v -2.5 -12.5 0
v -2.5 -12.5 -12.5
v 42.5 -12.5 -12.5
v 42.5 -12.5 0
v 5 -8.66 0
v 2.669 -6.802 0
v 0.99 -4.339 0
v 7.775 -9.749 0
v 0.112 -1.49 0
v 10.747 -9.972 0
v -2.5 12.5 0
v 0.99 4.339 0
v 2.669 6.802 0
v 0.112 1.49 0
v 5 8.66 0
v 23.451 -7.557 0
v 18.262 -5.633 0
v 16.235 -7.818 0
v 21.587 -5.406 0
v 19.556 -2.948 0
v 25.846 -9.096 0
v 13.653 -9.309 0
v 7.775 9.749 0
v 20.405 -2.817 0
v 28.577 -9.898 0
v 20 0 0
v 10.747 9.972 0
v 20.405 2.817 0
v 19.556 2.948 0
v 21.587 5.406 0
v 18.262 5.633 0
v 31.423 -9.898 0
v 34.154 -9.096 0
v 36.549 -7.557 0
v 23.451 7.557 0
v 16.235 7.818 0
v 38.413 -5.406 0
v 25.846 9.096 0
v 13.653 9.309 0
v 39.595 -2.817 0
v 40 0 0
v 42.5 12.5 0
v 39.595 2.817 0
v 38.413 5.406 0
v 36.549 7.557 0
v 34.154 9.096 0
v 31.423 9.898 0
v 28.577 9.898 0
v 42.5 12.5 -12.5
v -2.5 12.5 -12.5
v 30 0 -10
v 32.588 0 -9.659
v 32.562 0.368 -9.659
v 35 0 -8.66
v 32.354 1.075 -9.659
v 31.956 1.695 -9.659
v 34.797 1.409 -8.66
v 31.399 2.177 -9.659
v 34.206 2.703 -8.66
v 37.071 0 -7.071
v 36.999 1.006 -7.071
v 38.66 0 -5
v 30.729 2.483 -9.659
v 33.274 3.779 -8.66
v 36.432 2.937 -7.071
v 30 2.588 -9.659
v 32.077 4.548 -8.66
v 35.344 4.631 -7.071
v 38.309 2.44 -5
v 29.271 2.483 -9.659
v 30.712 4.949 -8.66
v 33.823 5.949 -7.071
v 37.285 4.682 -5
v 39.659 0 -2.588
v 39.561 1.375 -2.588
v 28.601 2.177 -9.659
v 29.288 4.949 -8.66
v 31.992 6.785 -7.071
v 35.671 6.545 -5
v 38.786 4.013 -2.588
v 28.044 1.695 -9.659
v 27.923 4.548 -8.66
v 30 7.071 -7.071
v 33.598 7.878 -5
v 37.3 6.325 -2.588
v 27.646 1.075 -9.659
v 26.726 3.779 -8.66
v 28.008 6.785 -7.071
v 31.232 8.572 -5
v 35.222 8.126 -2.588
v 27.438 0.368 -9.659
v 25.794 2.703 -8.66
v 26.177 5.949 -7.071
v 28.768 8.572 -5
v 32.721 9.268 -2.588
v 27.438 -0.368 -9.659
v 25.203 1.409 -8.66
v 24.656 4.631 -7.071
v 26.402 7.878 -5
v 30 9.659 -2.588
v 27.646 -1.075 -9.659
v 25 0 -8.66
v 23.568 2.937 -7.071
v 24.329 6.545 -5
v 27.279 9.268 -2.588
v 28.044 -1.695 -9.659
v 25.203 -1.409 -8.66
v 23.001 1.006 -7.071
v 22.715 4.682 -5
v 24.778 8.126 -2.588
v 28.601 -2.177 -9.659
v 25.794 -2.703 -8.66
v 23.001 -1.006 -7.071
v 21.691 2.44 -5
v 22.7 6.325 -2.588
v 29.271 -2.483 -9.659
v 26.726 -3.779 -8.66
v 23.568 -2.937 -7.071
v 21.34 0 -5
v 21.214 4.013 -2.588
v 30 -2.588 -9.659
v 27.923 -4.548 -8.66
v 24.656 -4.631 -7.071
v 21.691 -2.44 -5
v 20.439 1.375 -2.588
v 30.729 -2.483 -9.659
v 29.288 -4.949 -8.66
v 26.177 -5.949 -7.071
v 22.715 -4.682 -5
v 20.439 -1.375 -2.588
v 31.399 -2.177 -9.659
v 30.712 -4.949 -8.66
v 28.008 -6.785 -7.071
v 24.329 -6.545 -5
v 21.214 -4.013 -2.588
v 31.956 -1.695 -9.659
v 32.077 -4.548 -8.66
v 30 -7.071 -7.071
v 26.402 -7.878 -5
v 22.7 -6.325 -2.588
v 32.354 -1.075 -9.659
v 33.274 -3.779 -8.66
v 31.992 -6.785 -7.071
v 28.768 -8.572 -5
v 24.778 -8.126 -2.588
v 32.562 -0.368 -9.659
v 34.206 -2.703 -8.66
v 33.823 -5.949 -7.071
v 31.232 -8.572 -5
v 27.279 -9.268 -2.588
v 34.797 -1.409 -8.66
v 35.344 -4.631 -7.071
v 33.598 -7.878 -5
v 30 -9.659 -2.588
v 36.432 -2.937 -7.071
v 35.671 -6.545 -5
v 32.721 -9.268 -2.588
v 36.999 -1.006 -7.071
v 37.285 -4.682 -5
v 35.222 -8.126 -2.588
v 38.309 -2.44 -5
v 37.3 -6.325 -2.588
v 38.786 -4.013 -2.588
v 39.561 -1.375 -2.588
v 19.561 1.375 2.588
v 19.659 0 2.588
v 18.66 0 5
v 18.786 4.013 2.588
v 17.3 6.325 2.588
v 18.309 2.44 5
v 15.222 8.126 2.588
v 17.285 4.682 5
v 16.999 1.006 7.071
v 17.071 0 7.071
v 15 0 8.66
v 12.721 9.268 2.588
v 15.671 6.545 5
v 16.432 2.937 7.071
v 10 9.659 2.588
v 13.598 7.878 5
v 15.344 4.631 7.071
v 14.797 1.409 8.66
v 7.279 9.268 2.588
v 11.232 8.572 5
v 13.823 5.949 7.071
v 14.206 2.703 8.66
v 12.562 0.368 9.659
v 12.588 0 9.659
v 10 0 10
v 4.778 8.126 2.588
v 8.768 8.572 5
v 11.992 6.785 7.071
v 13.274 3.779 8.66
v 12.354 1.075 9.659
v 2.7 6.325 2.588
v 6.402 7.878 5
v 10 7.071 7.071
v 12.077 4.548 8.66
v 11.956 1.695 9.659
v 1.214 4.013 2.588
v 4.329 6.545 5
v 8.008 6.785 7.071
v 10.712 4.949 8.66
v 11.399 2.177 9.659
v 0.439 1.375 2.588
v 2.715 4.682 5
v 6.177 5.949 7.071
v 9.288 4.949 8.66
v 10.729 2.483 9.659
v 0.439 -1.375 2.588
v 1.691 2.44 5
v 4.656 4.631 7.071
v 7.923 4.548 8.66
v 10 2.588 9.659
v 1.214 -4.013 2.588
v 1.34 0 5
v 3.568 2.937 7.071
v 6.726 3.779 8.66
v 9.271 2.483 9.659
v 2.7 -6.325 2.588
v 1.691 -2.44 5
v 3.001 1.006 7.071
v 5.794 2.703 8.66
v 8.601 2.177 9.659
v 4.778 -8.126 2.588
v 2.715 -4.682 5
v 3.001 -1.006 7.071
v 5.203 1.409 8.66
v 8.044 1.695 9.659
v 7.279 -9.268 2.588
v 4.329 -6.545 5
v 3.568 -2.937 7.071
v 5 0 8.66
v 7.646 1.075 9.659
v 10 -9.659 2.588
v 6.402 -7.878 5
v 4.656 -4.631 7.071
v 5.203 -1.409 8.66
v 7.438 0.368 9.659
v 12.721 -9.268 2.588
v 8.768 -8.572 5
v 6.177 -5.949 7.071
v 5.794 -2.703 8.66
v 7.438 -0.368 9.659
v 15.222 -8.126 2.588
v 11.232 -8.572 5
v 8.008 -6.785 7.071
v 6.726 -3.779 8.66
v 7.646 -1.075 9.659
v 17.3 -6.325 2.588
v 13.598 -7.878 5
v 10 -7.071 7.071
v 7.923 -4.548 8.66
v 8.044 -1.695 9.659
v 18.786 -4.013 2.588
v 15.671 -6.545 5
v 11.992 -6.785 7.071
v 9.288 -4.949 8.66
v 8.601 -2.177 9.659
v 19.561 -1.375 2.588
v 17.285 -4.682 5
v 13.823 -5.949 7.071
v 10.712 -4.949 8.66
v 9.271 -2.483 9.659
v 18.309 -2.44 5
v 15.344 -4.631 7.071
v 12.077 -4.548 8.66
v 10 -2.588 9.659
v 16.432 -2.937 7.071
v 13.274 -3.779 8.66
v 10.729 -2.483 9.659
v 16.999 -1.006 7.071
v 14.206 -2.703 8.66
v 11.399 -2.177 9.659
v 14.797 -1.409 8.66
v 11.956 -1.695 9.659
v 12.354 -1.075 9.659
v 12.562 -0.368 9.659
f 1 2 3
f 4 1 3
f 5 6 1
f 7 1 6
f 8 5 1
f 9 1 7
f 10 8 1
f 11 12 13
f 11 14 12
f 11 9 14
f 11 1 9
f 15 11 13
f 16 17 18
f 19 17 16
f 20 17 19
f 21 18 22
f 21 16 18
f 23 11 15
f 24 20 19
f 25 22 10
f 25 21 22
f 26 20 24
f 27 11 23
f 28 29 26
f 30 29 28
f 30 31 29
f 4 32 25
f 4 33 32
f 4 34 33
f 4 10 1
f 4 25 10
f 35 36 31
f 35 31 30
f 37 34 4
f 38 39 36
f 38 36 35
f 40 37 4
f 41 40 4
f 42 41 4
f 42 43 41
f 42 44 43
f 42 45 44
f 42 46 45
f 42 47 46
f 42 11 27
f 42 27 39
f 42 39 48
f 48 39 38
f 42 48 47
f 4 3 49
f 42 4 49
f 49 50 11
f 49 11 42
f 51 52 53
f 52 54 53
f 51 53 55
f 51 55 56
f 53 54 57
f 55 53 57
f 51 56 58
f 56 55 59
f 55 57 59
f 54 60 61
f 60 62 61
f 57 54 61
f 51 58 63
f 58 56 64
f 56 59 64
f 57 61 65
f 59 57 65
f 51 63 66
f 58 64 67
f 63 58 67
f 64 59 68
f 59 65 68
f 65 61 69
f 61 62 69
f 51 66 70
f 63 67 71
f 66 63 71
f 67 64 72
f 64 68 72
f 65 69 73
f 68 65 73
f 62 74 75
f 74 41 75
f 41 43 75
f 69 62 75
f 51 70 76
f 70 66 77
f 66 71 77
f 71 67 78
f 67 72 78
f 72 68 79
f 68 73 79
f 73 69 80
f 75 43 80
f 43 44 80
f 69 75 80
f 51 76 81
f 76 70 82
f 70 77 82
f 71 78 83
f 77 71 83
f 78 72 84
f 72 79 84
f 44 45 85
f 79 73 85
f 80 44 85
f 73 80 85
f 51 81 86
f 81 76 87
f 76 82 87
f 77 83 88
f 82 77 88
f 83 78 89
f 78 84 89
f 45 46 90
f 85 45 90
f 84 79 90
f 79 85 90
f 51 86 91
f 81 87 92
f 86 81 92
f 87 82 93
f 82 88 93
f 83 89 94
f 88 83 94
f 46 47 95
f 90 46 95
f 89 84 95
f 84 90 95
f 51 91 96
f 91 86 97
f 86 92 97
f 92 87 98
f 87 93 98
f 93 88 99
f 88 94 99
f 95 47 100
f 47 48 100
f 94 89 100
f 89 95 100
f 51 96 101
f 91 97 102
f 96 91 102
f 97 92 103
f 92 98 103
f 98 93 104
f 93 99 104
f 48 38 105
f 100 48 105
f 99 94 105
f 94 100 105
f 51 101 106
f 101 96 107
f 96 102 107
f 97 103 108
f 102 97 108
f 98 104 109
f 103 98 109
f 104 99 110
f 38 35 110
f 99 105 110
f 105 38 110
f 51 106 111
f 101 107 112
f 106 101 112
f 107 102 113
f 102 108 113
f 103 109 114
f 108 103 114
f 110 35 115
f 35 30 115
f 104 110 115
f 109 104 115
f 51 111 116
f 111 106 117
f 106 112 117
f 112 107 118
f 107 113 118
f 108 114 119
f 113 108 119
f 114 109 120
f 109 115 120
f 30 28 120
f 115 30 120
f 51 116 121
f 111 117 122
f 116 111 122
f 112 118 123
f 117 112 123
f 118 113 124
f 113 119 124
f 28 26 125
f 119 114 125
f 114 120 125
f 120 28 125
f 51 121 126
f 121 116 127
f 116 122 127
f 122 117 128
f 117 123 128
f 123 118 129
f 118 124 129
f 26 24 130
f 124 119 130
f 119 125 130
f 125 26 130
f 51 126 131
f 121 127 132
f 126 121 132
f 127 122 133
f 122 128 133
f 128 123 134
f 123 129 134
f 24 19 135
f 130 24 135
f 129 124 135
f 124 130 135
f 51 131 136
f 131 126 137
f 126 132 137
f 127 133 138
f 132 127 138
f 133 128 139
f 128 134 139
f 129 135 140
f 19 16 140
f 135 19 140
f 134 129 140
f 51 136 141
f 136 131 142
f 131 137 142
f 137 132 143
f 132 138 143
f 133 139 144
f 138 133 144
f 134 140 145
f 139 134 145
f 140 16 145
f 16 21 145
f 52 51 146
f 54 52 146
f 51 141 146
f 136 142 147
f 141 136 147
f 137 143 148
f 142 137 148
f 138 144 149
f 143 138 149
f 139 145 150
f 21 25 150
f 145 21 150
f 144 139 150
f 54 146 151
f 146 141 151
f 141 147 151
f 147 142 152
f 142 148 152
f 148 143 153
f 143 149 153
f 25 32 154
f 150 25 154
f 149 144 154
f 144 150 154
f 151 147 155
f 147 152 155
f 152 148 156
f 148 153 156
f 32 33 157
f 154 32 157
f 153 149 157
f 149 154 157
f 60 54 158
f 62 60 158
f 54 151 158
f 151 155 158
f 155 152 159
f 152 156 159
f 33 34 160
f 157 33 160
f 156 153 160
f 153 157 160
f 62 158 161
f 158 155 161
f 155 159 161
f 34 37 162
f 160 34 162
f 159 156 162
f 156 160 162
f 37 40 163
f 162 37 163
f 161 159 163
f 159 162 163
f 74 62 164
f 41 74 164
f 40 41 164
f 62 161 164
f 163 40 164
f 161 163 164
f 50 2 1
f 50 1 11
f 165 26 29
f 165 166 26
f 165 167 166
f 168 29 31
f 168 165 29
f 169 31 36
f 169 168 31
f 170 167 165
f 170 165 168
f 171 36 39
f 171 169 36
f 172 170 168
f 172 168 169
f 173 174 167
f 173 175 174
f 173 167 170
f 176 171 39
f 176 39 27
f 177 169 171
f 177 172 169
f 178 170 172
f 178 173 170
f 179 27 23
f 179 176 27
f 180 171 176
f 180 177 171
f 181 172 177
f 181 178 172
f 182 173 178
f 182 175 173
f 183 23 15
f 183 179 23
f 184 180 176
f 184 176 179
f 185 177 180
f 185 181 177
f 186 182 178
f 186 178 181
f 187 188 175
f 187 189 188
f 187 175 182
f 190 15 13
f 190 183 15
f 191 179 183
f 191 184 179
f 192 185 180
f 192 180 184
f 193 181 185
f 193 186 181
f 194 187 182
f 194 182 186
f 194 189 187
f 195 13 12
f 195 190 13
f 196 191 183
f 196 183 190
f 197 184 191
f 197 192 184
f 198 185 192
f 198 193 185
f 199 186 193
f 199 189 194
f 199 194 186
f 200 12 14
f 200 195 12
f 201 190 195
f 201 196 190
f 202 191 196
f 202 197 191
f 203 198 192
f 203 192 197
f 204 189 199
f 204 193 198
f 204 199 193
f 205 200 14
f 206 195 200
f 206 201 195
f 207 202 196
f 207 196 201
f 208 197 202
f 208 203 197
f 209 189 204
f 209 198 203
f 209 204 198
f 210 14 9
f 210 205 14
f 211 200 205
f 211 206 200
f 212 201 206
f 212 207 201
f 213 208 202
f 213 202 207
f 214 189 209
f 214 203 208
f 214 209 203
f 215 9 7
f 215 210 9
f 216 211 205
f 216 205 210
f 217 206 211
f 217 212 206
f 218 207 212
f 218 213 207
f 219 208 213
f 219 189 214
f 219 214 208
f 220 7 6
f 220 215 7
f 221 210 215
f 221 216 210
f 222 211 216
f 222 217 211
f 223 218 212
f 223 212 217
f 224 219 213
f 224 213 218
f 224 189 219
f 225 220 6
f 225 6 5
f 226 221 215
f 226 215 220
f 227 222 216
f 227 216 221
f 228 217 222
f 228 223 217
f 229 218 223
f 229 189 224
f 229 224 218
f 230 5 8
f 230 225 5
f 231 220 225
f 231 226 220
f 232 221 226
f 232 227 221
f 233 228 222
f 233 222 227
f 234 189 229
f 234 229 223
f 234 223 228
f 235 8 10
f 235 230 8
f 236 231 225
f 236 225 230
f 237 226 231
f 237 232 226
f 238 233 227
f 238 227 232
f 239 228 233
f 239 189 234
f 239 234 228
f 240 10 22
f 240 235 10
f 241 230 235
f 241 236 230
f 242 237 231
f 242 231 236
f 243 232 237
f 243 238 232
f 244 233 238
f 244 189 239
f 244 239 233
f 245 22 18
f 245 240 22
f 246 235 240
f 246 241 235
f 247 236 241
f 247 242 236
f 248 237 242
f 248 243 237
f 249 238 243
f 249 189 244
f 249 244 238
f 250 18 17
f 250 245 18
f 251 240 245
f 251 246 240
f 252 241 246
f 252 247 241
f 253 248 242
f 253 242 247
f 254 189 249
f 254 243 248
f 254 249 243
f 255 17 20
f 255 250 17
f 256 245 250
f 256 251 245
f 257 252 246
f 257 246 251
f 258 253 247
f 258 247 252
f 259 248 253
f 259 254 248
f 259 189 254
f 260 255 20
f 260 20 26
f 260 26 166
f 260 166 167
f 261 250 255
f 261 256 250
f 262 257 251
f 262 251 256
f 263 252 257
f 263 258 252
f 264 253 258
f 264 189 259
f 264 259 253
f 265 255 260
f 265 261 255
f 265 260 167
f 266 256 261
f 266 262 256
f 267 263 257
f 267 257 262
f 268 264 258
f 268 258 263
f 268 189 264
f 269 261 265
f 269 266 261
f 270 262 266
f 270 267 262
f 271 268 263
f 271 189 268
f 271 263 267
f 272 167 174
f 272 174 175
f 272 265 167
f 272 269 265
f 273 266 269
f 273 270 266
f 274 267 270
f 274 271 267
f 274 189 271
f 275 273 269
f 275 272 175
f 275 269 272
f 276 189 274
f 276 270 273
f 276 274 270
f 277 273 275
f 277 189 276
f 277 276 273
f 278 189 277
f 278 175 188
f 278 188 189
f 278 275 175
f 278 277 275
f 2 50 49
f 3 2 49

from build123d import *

# Parameters (mm, degrees)
BOX_W     = 45
BOX_H     = 25
BOX_DEPTH = 12.5


with BuildPart() as sphere001:
    # Sphere001 → Sphere001 (revolve)
    with BuildSketch(Plane(origin=(30, 0, 0), x_dir=(1, 0, 0), z_dir=(0, -1, 0))):
        with BuildLine():
            ThreePointArc((0, -10), (10, 0), (0, 10))
            Line((0, 10), (0, -10))
        make_face()
    revolve(axis=Axis((30, 0, 0), (0, 0, 1)))


with BuildPart() as cube:
    # Box → Box (new body)
    with BuildSketch(Plane(origin=(-2.5, -12.5, -12.5), x_dir=(1, 0, 0), z_dir=(0, 0, 1))):
        with Locations((22.5, 12.5)):
            Rectangle(BOX_W, BOX_H)
    extrude(amount=BOX_DEPTH)


with BuildPart() as cut:
    # Sphere → Sphere (revolve)
    with BuildSketch(Plane(origin=(10, 0, 0), x_dir=(1, 0, 0), z_dir=(0, -1, 0))):
        with BuildLine():
            ThreePointArc((0, -10), (10, 0), (0, 10))
            Line((0, 10), (0, -10))
        make_face()
    revolve(axis=Axis((10, 0, 0), (0, 0, 1)))

    # Fusion: union Cube
    add(cube.part)

    # Cut: cut Sphere001
    add(sphere001.part, mode=Mode.SUBTRACT)


solid = cut.part
